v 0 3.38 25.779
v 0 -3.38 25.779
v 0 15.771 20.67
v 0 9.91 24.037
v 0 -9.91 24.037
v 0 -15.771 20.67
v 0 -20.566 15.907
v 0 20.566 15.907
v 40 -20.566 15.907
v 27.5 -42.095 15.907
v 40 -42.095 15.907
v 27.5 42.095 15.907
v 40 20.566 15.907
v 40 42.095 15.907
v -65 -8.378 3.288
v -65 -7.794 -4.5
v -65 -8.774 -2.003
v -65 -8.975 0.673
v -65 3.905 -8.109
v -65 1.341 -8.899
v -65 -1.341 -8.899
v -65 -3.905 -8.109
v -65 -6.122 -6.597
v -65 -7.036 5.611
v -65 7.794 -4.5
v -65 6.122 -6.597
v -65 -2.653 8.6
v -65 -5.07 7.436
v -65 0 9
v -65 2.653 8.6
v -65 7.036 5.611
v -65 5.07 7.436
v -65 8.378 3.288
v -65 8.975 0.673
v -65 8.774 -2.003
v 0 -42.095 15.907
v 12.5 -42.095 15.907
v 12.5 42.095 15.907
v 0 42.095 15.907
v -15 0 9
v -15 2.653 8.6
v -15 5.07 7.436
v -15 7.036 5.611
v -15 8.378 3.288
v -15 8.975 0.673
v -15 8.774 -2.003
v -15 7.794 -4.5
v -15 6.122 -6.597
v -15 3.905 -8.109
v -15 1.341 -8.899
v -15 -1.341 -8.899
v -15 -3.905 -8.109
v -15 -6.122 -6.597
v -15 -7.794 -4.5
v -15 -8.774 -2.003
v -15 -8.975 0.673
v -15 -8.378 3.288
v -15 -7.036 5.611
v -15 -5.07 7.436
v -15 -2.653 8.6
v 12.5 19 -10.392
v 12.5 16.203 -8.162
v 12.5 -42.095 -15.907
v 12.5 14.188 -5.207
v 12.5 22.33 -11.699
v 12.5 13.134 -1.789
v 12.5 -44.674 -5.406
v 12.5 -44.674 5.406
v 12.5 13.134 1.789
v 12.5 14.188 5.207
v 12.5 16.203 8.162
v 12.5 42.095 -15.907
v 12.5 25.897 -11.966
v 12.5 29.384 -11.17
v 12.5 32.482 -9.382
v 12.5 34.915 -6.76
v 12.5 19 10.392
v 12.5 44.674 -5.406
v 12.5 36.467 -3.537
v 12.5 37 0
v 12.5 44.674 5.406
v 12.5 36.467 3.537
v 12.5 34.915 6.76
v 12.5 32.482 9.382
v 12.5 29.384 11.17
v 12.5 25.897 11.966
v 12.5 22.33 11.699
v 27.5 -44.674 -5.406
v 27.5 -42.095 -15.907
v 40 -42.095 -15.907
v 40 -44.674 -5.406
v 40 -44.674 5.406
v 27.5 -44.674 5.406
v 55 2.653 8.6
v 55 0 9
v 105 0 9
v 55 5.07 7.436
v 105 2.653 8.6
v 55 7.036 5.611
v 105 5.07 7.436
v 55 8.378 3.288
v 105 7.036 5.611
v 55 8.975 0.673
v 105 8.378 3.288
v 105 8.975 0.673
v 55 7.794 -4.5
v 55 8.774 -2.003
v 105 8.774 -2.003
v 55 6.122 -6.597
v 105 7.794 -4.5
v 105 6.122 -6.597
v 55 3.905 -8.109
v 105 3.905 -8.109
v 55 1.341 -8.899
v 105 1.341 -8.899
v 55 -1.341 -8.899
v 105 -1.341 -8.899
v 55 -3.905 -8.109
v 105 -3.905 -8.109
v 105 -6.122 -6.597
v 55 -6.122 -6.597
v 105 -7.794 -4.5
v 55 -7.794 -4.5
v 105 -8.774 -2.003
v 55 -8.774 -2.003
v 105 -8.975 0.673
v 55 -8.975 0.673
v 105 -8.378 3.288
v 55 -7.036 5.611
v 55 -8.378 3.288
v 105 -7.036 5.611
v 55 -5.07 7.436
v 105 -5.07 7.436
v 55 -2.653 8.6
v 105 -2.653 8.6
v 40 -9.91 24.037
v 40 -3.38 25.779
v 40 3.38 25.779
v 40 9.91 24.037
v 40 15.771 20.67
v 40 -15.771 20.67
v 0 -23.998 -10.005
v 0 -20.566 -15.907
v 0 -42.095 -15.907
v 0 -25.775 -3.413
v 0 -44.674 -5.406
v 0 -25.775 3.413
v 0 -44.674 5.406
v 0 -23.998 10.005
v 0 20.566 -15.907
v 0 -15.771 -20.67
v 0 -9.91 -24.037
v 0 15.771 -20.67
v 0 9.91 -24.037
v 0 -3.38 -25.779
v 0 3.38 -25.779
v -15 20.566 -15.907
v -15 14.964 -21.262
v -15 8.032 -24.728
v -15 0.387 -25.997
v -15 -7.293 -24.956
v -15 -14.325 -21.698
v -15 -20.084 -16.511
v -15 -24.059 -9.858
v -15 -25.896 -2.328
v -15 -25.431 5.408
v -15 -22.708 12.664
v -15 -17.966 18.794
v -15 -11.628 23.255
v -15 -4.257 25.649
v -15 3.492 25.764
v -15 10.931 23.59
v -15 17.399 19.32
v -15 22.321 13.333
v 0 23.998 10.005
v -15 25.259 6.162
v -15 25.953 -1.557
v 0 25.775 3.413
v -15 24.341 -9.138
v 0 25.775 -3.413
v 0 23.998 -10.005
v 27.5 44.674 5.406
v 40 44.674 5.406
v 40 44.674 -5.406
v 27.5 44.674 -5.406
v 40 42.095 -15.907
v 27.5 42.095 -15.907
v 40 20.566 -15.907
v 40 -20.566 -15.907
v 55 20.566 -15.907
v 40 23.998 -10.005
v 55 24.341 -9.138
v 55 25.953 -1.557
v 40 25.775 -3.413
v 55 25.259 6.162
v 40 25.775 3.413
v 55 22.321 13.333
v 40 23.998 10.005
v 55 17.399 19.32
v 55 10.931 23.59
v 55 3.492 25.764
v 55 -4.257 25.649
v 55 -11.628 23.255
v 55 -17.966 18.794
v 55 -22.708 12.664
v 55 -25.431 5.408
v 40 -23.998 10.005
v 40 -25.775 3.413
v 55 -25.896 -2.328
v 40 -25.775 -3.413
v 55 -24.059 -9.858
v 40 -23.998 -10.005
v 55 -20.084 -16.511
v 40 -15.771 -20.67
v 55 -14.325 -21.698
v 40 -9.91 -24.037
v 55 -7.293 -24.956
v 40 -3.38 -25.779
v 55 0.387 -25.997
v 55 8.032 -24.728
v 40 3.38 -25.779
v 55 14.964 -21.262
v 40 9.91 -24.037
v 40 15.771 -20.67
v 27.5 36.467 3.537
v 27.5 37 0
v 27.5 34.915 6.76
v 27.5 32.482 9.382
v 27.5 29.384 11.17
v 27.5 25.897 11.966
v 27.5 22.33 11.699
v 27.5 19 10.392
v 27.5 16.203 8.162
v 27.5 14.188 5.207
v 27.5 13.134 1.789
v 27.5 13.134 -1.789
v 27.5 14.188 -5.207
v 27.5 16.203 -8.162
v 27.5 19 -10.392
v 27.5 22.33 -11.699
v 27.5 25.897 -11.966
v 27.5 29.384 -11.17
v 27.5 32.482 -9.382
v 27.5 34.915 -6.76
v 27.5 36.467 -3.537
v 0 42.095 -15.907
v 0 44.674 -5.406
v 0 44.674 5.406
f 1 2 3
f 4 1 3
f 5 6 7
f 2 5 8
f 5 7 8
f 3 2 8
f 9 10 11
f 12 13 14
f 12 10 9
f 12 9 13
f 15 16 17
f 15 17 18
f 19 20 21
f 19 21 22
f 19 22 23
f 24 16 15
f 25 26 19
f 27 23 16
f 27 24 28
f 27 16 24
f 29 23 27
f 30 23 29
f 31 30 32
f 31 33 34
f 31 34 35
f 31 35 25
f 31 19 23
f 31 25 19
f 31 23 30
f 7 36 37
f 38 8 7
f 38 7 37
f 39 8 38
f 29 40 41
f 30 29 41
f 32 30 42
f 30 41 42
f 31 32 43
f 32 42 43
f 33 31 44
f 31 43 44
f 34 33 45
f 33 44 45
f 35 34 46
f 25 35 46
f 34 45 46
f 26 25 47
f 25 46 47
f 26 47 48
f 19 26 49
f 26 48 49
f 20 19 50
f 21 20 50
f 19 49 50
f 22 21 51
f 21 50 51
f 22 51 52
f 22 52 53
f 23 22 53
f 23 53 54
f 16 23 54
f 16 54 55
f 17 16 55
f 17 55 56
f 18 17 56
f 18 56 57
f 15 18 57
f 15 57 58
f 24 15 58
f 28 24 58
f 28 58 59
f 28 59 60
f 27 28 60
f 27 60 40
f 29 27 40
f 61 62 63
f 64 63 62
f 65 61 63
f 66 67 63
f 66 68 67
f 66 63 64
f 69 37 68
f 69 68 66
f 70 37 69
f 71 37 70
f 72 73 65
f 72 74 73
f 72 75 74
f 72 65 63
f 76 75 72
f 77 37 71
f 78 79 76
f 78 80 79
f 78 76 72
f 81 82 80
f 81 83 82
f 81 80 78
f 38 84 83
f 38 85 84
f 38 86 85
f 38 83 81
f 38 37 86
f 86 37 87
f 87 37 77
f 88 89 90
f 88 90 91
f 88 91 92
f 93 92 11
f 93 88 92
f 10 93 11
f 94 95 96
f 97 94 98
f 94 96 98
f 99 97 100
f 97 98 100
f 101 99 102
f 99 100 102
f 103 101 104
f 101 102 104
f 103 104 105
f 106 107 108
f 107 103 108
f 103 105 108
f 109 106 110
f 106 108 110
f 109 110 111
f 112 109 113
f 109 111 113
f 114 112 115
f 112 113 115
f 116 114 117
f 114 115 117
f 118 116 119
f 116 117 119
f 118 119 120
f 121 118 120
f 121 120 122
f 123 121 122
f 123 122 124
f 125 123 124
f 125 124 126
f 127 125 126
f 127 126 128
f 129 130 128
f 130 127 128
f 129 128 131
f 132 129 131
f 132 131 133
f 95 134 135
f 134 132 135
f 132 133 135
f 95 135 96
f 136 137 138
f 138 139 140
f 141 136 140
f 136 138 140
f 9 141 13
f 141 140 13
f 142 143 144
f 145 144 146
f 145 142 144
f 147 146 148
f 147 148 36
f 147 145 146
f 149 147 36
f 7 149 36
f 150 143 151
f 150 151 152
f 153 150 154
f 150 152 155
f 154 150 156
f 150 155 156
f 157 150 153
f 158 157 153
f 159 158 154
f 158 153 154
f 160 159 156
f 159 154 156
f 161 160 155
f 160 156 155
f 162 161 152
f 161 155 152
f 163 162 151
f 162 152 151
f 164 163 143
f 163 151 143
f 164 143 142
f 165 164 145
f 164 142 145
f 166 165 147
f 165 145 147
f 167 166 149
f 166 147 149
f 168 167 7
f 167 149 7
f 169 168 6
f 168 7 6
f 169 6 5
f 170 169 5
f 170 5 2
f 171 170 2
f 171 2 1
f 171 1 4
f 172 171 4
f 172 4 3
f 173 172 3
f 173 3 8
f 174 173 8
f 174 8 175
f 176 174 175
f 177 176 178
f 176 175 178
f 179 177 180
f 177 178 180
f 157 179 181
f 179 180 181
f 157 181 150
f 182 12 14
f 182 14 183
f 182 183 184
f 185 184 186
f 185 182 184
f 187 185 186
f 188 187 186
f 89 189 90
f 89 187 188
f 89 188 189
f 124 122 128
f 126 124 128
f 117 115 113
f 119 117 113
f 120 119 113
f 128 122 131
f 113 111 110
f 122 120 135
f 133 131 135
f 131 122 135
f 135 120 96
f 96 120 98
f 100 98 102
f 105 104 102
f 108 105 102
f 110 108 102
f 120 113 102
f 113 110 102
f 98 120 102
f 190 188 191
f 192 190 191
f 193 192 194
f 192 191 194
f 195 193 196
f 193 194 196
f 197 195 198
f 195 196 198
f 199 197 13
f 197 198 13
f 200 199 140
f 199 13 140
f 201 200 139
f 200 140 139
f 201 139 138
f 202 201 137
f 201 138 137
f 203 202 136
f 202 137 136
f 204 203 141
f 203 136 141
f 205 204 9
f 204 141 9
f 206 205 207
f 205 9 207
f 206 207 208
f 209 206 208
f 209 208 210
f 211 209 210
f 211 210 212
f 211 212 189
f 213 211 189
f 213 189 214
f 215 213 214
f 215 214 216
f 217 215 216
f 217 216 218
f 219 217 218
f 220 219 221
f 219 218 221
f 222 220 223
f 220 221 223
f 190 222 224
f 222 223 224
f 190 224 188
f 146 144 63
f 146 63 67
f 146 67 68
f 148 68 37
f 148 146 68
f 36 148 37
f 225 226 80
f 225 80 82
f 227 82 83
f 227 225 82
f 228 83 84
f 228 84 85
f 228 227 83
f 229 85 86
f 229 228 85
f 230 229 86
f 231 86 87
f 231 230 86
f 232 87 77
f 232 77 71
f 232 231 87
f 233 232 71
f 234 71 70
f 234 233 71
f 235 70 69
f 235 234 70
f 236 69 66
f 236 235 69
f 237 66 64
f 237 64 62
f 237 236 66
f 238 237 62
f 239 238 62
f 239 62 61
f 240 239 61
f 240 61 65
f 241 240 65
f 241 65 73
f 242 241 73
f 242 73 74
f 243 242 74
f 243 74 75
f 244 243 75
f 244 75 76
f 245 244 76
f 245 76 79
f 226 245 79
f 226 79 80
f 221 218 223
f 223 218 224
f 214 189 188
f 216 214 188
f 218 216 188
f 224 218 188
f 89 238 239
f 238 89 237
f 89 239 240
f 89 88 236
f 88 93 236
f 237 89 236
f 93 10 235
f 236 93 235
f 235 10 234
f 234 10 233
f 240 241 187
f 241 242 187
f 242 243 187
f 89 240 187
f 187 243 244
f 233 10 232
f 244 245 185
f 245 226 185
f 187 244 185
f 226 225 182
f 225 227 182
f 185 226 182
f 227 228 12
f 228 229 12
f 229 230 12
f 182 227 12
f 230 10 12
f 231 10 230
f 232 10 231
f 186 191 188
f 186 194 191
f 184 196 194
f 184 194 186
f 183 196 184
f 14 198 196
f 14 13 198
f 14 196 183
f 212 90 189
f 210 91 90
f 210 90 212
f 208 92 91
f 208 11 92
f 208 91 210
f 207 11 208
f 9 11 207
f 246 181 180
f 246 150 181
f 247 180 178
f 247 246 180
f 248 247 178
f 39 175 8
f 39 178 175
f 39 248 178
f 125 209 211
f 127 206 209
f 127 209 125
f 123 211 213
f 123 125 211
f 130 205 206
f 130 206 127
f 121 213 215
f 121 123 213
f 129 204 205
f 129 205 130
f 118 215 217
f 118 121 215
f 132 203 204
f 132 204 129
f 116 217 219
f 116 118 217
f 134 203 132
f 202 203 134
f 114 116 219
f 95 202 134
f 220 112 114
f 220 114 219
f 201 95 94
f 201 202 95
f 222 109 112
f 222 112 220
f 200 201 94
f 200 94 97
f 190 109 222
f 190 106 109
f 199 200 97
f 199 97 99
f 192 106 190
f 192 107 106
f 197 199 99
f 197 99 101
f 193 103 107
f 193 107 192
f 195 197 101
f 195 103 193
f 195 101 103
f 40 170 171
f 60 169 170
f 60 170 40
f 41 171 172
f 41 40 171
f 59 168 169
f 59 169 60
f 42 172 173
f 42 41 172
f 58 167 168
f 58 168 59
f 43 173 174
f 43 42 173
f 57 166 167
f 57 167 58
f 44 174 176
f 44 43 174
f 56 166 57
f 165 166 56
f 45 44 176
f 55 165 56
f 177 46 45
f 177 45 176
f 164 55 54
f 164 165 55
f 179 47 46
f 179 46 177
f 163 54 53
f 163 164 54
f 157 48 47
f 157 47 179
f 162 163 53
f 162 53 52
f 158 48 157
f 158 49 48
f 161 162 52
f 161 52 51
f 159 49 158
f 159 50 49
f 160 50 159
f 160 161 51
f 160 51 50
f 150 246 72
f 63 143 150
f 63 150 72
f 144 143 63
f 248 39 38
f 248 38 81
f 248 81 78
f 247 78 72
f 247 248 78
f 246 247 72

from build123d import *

# Parameters (mm, degrees)
BOSS_EXTRUDE1_DEPTH      = 40
BOSS_EXTRUDE2_DEPTH      = 65
BOSS_EXTRUDE2_DEPTH_BACK = 105
SKETCH2_R                = 9
SKETCH3_W                = 15
SKETCH3_H                = 130
CUT_EXTRUDE1_DEPTH       = 31.813269935
SKETCH4_R                = 12
BOSS_EXTRUDE3_DEPTH      = 40
SKETCH5_R                = 26
BOSS_EXTRUDE4_DEPTH      = 15
SKETCH6_R                = 26
BOSS_EXTRUDE5_DEPTH      = 15


with BuildPart() as part:
    # Sketch1 → Boss-Extrude1 (new body)
    with BuildSketch(Plane(origin=(0, 0, 0), x_dir=(0, 0, -1), z_dir=(1, 0, 0))):
        with BuildLine():
            Line((-15.906634967, -42.094880497), (-15.906634967, 42.094880497))
            ThreePointArc((-15.906634967, 42.094880497), (0, 45), (15.906634967, 42.094880497))
            Line((15.906634967, 42.094880497), (15.906634967, -42.094880497))
            ThreePointArc((15.906634967, -42.094880497), (0, -45), (-15.906634967, -42.094880497))
        make_face()
    extrude(amount=BOSS_EXTRUDE1_DEPTH)

    # Sketch2 → Boss-Extrude2 (add, two sides: drawn at the far end of the back side and taken through both)
    with BuildSketch(Plane.ZY.offset(-BOSS_EXTRUDE2_DEPTH_BACK)):
        Circle(SKETCH2_R)
    extrude(amount=BOSS_EXTRUDE2_DEPTH + BOSS_EXTRUDE2_DEPTH_BACK)

    # Sketch3 → Cut-Extrude1 (cut)
    with BuildSketch(Plane.XY.offset(15.906634967)):
        with Locations((20, 0.729141458)):
            Rectangle(SKETCH3_W, SKETCH3_H)
    extrude(amount=-CUT_EXTRUDE1_DEPTH, mode=Mode.SUBTRACT)


with BuildPart() as cut_extrude1_piece_1:
    # of the separate pieces the step leaves, piece 1, a body of its own (cut_extrude1_pieces)
    add(part.part.solids().sort_by_distance((0, -42.094880497, -15.906634967))[0])



with BuildPart() as cut_extrude1_piece_2:
    # of the separate pieces the step leaves, piece 2, a body of its own (cut_extrude1_pieces)
    add(part.part.solids().sort_by_distance((27.5, -42.094880497, -15.906634968))[0])


with BuildPart() as cut_extrude1_piece_1_1:
    add(cut_extrude1_piece_1.part)

    add(cut_extrude1_piece_2.part)  # Boss-Extrude3 merges Cut-Extrude1 piece 2
    # Sketch4 → Boss-Extrude3 (add)
    with BuildSketch(Plane(origin=(40, 0, 0), x_dir=(0, 0, -1), z_dir=(1, 0, 0))):
        with Locations(Location((0, 25, 0), (0, 0, 90))):
            Circle(SKETCH4_R)
    extrude(amount=-BOSS_EXTRUDE3_DEPTH)

    # Sketch5 → Boss-Extrude4 (add)
    with BuildSketch(Plane.ZY):
        with Locations(Location((0, 0, 0), (0, 0, 127.719309026))):
            Circle(SKETCH5_R)
    extrude(amount=BOSS_EXTRUDE4_DEPTH)

    # Sketch6 → Boss-Extrude5 (add)
    with BuildSketch(Plane(origin=(40, 0, 0), x_dir=(0, 0, -1), z_dir=(1, 0, 0))):
        with Locations(Location((0, 0, 0), (0, 0, 52.280690974))):
            Circle(SKETCH6_R)
    extrude(amount=BOSS_EXTRUDE5_DEPTH)


solid = cut_extrude1_piece_1_1.part
